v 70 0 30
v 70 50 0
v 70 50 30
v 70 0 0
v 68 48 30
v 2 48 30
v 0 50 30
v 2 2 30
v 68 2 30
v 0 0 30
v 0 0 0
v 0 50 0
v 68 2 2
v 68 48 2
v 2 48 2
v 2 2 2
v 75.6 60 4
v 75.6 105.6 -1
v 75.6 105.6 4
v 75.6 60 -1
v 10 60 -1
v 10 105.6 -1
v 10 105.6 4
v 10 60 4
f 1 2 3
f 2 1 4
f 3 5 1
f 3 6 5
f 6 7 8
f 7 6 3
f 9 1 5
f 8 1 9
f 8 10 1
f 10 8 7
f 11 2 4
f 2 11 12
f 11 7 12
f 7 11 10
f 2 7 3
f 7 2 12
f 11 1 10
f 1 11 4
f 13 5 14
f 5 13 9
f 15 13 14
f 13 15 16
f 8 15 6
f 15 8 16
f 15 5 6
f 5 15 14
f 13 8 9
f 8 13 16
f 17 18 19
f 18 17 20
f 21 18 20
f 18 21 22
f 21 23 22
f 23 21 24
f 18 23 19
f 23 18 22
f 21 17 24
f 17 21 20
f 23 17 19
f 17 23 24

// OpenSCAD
// Two-part enclosure for small electronics board
// Print orientation: both parts on the bed, lid on +X side of box

// ---- Box ----
box_x = 70;      // outer length (X)
box_y = 50;      // outer width (Y)
box_z = 30;      // outer height (Z)
wall = 2;        // wall thickness
floor = 2;       // floor thickness

// ---- Lid ----
lip_w = 65.6;    // lip outer length (X)
lip_d = 45.6;    // lip outer width (Y)
lip_h = 4;       // lip height (Z)
lip_t = 1.5;     // lip wall thickness

// ---- Misc ----
eps = 0.5;       // cutter overshoot
gap = 10;        // gap between parts on bed
$fn = 64;

// Derived
inner_x = box_x - 2*wall;
inner_y = box_y - 2*wall;
lip_f  = lip_w - inner_x + 0.4;  // clearance 0.2 each side
lip_b  = lip_d - inner_y + 0.4;

module box() {
    difference() {
        cube([box_x, box_y, box_z]);
        translate([wall, wall, floor])
            cube([inner_x, inner_y, box_z - floor]);   // open top
    }
}

module lid() {
    translate([gap, 0, 0])
        union() {
            // plate
            translate([0, 0, -1])
                cube([lip_w, lip_d, 2]);
            // lip (overlaps plate -> fuses)
            translate([-lip_f/2, -lip_b/2, 0])
                cube([lip_w, lip_d, lip_h]);
        }
}

box();
translate([0, box_y + 10, 0])
    lid();
